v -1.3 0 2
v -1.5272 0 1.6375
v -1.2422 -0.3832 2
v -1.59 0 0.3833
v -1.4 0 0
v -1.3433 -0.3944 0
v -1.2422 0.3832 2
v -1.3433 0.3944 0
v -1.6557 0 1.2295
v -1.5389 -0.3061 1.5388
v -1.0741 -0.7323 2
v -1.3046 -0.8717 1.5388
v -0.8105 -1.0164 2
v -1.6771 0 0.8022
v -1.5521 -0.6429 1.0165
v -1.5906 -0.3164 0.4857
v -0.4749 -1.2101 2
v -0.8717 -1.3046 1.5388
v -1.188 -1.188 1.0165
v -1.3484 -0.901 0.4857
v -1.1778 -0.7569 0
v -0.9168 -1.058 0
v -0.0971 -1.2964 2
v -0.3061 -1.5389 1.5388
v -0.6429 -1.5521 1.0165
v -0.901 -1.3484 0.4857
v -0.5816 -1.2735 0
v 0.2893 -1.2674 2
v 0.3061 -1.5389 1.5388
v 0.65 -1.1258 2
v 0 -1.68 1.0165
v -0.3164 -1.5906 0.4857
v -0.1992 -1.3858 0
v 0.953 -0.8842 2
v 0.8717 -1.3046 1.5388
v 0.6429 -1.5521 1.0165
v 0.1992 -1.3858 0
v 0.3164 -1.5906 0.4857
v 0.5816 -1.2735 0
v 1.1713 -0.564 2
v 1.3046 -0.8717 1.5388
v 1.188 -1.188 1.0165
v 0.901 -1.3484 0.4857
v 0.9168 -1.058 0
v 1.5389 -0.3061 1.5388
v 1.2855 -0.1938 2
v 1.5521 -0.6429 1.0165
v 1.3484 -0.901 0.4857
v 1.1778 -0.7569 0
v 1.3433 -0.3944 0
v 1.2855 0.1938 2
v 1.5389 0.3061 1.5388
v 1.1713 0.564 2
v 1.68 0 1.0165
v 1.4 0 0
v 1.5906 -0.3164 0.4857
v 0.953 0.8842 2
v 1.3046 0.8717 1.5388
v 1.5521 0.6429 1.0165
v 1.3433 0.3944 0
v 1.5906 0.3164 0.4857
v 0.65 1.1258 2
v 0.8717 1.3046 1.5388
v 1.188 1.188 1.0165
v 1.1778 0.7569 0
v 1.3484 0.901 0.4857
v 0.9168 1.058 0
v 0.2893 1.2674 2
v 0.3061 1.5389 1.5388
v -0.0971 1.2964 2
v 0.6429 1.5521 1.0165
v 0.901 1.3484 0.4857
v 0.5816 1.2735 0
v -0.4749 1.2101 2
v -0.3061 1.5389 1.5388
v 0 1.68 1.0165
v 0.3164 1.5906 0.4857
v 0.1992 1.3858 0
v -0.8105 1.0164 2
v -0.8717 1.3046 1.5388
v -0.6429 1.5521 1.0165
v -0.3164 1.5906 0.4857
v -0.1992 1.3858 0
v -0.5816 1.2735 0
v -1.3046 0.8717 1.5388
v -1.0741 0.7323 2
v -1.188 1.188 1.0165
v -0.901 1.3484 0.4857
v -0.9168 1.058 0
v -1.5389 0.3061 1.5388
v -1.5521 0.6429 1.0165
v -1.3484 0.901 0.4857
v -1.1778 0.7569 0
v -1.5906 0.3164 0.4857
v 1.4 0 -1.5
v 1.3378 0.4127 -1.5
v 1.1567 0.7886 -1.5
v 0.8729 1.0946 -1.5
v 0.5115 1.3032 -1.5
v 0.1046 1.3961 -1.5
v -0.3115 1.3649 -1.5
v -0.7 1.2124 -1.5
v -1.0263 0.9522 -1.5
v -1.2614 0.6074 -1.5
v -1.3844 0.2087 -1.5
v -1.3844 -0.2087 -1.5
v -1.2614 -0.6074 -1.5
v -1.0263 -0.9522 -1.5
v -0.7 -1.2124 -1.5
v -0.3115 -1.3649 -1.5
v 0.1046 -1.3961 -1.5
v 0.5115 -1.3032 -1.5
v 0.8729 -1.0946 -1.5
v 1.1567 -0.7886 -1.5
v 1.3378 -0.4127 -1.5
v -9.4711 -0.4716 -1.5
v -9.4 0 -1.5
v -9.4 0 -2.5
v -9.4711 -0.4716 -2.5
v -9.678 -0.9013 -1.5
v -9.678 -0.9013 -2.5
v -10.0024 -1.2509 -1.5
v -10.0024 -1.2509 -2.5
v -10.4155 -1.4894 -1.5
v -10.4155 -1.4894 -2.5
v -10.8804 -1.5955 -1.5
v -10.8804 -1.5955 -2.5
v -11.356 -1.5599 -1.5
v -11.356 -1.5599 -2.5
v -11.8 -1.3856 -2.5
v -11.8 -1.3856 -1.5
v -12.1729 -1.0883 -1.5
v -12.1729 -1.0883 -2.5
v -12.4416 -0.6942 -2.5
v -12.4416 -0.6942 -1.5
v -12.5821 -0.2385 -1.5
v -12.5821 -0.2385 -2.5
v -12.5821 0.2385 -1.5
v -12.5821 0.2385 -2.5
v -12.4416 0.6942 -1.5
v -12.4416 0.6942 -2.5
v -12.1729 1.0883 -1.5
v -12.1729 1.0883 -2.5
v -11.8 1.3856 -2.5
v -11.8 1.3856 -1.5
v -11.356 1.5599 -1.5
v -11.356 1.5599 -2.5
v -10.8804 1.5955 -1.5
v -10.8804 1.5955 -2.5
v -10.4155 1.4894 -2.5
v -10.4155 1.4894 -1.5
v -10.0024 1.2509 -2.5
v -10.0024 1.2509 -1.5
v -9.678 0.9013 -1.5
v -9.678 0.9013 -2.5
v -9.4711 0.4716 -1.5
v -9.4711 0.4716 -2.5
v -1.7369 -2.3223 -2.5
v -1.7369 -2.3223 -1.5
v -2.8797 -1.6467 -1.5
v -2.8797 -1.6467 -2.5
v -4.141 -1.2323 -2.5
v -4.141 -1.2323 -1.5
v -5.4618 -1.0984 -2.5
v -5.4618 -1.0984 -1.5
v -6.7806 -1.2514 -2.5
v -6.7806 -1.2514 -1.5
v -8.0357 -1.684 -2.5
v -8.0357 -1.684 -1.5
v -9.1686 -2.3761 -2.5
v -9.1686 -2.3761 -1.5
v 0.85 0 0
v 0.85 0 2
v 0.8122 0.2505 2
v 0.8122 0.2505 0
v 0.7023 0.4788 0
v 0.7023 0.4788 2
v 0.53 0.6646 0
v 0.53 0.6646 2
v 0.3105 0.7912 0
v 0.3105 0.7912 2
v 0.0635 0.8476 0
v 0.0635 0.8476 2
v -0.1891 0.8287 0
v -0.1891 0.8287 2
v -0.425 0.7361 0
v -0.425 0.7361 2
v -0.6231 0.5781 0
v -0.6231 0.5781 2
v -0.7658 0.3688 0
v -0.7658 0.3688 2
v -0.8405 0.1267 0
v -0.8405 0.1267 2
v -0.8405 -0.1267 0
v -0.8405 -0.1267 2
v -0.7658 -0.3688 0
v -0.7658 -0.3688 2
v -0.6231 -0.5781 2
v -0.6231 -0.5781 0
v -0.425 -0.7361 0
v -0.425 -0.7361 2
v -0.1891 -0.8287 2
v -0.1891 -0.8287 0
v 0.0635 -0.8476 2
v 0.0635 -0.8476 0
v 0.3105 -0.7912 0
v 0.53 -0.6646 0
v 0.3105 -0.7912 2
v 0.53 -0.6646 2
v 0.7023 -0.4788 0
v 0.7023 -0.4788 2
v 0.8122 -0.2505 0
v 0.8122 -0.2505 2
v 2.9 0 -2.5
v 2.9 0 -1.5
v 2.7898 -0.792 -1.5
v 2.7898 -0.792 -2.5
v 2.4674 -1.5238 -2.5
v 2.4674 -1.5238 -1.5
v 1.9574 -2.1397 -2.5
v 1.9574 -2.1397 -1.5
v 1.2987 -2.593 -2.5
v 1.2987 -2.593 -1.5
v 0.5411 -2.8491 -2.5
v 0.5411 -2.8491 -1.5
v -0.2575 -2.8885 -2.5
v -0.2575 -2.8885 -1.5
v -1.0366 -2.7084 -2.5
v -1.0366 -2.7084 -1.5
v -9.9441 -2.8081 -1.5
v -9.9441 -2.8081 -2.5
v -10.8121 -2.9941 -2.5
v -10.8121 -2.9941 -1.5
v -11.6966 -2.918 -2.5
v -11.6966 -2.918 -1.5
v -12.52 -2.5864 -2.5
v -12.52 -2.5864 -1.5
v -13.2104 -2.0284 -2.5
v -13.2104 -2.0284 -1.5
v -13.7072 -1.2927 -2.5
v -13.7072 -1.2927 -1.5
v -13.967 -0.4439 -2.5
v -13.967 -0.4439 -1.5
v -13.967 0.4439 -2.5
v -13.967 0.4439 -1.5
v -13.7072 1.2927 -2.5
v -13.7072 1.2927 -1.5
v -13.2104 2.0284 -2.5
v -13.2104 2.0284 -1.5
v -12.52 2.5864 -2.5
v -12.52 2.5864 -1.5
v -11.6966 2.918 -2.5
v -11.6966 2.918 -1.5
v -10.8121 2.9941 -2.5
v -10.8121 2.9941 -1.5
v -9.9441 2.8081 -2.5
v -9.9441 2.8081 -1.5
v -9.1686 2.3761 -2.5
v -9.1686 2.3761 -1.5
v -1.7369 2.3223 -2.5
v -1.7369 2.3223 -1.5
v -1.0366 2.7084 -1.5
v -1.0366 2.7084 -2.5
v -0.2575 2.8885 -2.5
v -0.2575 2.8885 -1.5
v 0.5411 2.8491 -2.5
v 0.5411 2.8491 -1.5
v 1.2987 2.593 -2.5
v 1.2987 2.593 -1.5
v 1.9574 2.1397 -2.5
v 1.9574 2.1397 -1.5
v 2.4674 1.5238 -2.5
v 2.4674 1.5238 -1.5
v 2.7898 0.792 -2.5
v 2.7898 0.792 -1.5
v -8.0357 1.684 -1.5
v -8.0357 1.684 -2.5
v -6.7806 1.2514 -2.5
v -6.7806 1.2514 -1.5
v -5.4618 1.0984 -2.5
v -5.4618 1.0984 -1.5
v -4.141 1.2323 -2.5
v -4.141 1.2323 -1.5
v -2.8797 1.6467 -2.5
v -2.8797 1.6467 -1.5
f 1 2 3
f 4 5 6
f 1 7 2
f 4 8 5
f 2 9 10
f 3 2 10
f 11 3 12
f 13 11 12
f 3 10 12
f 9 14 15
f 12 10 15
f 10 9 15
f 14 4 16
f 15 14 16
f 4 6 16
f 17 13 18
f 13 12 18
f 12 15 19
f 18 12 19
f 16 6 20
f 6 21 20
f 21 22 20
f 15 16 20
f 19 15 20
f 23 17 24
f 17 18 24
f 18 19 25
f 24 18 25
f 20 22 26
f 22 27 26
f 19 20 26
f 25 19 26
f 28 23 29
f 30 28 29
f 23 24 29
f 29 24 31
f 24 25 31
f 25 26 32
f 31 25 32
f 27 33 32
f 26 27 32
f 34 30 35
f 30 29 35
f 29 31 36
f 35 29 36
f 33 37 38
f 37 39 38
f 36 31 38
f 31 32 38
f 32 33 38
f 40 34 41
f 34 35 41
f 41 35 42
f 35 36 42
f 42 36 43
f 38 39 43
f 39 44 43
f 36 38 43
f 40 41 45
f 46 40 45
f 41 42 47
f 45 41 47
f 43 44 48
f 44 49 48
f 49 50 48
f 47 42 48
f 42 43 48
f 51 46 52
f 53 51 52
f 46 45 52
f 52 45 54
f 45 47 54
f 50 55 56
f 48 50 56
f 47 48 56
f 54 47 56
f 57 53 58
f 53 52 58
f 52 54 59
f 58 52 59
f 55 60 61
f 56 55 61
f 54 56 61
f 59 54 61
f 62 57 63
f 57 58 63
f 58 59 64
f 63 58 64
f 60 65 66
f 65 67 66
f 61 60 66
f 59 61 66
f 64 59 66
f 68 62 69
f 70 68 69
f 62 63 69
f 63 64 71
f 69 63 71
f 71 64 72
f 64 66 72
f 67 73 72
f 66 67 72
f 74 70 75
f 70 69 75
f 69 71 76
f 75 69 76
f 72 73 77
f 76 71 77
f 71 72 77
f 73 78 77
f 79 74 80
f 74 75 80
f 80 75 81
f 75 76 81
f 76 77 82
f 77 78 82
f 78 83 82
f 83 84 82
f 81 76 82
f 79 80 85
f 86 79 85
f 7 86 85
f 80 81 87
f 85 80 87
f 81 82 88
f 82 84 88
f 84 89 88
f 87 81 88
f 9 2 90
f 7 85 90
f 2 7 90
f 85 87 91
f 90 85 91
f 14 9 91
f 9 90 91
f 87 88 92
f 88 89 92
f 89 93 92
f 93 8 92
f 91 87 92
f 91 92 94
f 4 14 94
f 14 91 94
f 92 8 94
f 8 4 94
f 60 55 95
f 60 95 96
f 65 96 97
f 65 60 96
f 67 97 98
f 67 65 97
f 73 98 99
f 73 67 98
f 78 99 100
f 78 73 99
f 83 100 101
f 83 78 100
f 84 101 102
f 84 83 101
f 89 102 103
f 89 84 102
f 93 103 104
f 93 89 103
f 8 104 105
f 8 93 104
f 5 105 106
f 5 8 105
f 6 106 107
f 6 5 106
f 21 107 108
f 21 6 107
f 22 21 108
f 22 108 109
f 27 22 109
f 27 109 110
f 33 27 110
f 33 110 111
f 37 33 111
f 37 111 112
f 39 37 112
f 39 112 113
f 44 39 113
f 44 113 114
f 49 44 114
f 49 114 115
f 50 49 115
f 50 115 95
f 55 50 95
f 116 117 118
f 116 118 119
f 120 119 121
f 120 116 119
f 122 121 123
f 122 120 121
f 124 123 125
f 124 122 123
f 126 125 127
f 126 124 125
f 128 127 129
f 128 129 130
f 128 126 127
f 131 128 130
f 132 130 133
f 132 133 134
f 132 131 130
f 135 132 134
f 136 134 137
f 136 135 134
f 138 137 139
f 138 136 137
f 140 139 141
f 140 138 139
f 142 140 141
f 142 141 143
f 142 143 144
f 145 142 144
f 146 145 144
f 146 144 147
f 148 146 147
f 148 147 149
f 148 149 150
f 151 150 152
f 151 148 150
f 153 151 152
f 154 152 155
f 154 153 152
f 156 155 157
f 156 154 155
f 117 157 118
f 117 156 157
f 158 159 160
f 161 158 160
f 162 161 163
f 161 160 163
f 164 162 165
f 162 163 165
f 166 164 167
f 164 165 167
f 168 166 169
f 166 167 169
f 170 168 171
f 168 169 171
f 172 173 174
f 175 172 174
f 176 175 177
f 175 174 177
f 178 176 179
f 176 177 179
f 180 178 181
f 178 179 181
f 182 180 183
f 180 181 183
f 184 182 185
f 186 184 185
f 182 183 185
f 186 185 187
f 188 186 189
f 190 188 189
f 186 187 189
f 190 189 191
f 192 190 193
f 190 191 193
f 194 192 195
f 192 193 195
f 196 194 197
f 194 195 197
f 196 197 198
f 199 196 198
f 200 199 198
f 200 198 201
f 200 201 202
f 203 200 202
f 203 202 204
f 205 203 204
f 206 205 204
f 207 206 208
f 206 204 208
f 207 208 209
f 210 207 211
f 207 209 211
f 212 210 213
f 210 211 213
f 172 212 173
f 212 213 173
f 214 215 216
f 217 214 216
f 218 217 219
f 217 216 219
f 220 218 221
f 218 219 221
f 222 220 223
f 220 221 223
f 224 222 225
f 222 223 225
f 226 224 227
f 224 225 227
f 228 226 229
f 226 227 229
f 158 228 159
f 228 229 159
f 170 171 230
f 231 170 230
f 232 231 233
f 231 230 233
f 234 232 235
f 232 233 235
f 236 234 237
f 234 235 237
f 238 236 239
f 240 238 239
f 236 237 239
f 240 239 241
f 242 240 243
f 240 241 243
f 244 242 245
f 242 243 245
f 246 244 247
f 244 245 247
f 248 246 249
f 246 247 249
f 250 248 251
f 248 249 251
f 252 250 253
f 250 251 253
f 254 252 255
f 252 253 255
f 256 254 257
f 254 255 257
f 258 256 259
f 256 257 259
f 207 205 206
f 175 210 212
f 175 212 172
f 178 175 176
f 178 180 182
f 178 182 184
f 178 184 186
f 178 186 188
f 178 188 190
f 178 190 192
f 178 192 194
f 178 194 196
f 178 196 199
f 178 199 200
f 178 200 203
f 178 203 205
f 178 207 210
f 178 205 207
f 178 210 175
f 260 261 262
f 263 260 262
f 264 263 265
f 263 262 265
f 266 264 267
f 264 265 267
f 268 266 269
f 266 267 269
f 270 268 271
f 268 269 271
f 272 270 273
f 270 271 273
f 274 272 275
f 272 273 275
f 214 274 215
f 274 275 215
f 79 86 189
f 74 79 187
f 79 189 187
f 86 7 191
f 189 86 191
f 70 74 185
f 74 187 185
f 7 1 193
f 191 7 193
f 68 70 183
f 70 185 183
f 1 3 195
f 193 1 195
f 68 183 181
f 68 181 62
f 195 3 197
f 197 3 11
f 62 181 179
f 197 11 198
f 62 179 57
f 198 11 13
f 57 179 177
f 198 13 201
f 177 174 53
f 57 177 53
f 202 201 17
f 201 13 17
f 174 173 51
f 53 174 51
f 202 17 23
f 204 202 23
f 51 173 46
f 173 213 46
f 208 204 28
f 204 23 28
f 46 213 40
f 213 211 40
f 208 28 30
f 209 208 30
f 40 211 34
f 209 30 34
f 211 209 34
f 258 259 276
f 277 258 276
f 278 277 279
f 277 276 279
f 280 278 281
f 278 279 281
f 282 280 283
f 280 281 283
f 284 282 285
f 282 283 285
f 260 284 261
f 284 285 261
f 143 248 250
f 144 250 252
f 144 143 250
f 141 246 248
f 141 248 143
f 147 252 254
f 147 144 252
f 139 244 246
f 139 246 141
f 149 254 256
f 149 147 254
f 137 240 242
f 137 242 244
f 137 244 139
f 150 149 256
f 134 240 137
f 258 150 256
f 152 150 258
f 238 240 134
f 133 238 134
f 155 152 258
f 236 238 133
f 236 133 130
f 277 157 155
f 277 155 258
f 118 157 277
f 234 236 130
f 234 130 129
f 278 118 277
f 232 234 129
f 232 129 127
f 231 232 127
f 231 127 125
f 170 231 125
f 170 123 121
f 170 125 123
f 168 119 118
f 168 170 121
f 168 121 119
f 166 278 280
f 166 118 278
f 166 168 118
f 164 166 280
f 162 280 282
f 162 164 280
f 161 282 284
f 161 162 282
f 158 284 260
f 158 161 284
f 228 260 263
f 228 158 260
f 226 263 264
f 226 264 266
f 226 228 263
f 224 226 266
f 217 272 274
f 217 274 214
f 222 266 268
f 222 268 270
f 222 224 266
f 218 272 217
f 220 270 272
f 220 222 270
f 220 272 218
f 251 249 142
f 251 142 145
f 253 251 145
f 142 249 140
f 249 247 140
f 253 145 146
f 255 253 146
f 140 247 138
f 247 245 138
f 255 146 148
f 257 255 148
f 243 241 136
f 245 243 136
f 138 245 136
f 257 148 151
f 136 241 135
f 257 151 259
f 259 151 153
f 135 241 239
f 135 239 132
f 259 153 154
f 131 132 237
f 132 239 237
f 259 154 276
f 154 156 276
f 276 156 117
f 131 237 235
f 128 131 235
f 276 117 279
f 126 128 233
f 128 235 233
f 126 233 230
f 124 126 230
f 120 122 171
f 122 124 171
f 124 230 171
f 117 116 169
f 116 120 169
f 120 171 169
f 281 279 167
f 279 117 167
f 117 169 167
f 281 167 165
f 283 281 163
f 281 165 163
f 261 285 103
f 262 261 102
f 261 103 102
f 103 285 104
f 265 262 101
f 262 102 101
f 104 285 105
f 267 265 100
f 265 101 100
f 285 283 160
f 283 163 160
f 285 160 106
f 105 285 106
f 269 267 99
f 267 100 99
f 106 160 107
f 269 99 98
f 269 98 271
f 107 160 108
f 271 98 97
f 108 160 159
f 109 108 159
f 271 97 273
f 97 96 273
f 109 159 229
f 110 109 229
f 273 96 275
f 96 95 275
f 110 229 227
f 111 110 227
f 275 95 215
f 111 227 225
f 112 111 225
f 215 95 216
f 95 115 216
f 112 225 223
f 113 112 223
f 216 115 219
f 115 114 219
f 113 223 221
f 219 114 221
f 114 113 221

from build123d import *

# Parameters (mm, degrees)
F0_R     = 1.4
F3_DEPTH = 1.5
F4_R     = 1.6
F4_R_2   = 1.4
F5_DEPTH = 1
F6_R     = 0.85
F7_DEPTH = 2


with BuildPart() as f2:
    # F1 (on Front) → F2 (revolve)
    with BuildSketch(Plane.XZ):
        with BuildLine():
            Line((-1.4, 0), (0, 0))
            Line((0, 0), (0, 2))
            Line((0, 2), (-1.3, 2))
            ThreePointArc((-1.3, 2), (-1.6800297616, 1.0165014881), (-1.4, 0))
        make_face()
    revolve(axis=Axis((0, 0, 1), (0, 0, 1)))

    # F0 (on Top) → F3 (join)
    with BuildSketch(Plane.XY):
        Circle(F0_R)
    extrude(amount=-F3_DEPTH)

    # F4 (on face) → F5 (join)
    with BuildSketch(Plane(origin=(0, 0, -1.5), x_dir=(1, 0, 0), z_dir=(0, 0, -1))):
        with BuildLine():
            ThreePointArc((-8, 0), (-8.3079577623, 1.323974543), (-9.168605727, 2.3761302609))
            ThreePointArc((-9.168605727, 2.3761302609), (-14, 0), (-9.168605727, -2.3761302609))
            ThreePointArc((-9.168605727, -2.3761302609), (-8.3079577623, -1.323974543), (-8, 0))
        make_face()
        with Locations((-11, 0)):
            Circle(F4_R, mode=Mode.SUBTRACT)
        with BuildLine():
            ThreePointArc((-1.7369017855, -2.3223204317), (1.2986502266, -2.592972732), (2.9, 0))
            ThreePointArc((2.9, 0), (1.2986502266, 2.592972732), (-1.7369017855, 2.3223204317))
            ThreePointArc((-1.7369017855, 2.3223204317), (-2.9, 0), (-1.7369017855, -2.3223204317))
        make_face()
        Circle(F4_R_2, mode=Mode.SUBTRACT)
        with BuildLine():
            ThreePointArc((-1.7369017855, -2.3223204317), (-2.9, 0), (-1.7369017855, 2.3223204317))
            ThreePointArc((-1.7369017855, 2.3223204317), (-5.4618104216, 1.0984045098), (-9.168605727, 2.3761302609))
            ThreePointArc((-9.168605727, 2.3761302609), (-8.3079577623, 1.323974543), (-8, 0))
            ThreePointArc((-8, 0), (-8.3079577623, -1.323974543), (-9.168605727, -2.3761302609))
            ThreePointArc((-9.168605727, -2.3761302609), (-5.4618104216, -1.0984045098), (-1.7369017855, -2.3223204317))
        make_face()
        Circle(F4_R_2)
    extrude(amount=F5_DEPTH)

    # F6 (on face) → F7 (cut)
    with BuildSketch(Plane.XY.offset(2)):
        Circle(F6_R)
    extrude(amount=-F7_DEPTH, mode=Mode.SUBTRACT)


solid = f2.part
